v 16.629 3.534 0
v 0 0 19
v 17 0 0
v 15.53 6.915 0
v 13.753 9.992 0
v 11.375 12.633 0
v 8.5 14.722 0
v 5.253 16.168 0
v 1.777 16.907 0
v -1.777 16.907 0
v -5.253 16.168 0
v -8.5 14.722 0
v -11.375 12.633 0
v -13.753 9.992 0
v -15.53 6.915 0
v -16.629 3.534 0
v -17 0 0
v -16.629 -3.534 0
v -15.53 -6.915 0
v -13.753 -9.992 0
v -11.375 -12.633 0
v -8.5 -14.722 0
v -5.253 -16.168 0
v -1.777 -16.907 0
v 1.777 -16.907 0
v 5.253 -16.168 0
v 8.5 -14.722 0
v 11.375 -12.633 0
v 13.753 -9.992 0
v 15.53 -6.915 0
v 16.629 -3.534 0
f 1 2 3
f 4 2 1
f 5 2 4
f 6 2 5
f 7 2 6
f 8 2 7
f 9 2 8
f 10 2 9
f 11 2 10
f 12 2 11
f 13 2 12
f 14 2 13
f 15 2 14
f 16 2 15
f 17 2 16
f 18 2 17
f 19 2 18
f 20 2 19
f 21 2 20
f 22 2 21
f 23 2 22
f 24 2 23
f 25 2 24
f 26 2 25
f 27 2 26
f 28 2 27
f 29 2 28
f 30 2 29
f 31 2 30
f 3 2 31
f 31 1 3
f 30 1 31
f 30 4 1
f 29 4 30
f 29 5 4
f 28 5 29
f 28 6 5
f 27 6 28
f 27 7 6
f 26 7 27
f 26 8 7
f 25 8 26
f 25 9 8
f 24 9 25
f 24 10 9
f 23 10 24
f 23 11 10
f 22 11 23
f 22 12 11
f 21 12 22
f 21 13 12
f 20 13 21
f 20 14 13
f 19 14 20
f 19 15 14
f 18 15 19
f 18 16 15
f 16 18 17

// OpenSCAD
// Generated by SolidPython 1.0.1 on 2020-07-29 00:46:43


cylinder(h = 19, r1 = 17, r2 = 0);
/***********************************************
*********      SolidPython code:      **********
************************************************
 
# import packages: SolidPython
from solid import *
from solid.utils import *
from itertools import chain, combinations, permutations


class Resize:

    def __init__(self, scad_file):
        self.scad_file = scad_file
        #self.scad_file = import_scad(scad_file)
        # cone/cylinder param:
        self.r1 = 0
        self.r2 = 0
        self.h = 0
        # rectangular prism param:
        self.w = 0
        self.l = 0
        # ellipse param:
        self.r = 0

    # import OpenScad code (file name corresponds to shape)


    # classify shape + parameters
    def assign(self, param1, param2, param3):
        if self.scad_file == 'cone.scad':
            self.r1 = param1
            self.r2 = param2
            self.h = param3
        elif self.scad_file == 'cylinder.scad':
            self.r1 = param1
            self.r2 = param2
            self.h = param3
        elif self.scad_file == 'rectangularPrism.scad':
            self.h = param1
            self.l = param2
            self.w = param3
        else:
            self.r = param1
            self.h = param2

    # resize parameters
    def iterate(self):
        x = range(3, 20, 2)
        i = 1
        if self.scad_file == 'cone.scad':
            tempList = list(permutations(x, 2))
            for temp in tempList:
                param1 = temp[0]
                param2 = temp[1]
                filepath = 'produced_scad_files/' + 'cone' + str(param1) + '_' + str(param2) + '_' + '.scad'
                scad_render_to_file(cylinder(h=param1, r1=param2, r2=0), filepath)

        elif self.scad_file == 'cylinder.scad':
            tempList = list(permutations(x, 3))
            for temp in tempList:
                param1 = temp[0]
                param2 = temp[1]
                filepath = 'produced_scad_files/' + 'cylinder' + str(param1) + '_' + str(param2) + '_' + '.scad'
                scad_render_to_file(cylinder(h=param1, r1=param2, r2=param2), filepath)

        elif self.scad_file == 'rectangularPrism.scad':
            tempList = list(permutations(x, 3))
            for temp in tempList:
                param1 = temp[0]
                param2 = temp[1]
                param3 = temp[2]
                filepath = 'produced_scad_files/' + 'rectangularPrism' + str(param1) + '_' + str(param2) + '_' + str(
                    param3) + '.scad'
                scad_render_to_file(cube(size=(param1, param2, param3)), filepath)

        elif self.scad_file == 'ellipse.scad':
            tempList = list(permutations(x, 4))
            for temp in tempList:
                param1 = temp[0]
                param2 = temp[1]
                param3 = temp[2]
                param4 = temp[3]
                filepath = 'produced_scad_files/' + 'ellipse' + str(param1) + '_' + str(param2) + '_' + str(param3) + '_' + str(param4) + '.scad'
                scad_render_to_file(scale([param1, param2, param3])(sphere(r=param4)), filepath)

    def render_to_scadfile(self):
        scad_render_to_file(scad, 'example.scad') 
 
************************************************/
